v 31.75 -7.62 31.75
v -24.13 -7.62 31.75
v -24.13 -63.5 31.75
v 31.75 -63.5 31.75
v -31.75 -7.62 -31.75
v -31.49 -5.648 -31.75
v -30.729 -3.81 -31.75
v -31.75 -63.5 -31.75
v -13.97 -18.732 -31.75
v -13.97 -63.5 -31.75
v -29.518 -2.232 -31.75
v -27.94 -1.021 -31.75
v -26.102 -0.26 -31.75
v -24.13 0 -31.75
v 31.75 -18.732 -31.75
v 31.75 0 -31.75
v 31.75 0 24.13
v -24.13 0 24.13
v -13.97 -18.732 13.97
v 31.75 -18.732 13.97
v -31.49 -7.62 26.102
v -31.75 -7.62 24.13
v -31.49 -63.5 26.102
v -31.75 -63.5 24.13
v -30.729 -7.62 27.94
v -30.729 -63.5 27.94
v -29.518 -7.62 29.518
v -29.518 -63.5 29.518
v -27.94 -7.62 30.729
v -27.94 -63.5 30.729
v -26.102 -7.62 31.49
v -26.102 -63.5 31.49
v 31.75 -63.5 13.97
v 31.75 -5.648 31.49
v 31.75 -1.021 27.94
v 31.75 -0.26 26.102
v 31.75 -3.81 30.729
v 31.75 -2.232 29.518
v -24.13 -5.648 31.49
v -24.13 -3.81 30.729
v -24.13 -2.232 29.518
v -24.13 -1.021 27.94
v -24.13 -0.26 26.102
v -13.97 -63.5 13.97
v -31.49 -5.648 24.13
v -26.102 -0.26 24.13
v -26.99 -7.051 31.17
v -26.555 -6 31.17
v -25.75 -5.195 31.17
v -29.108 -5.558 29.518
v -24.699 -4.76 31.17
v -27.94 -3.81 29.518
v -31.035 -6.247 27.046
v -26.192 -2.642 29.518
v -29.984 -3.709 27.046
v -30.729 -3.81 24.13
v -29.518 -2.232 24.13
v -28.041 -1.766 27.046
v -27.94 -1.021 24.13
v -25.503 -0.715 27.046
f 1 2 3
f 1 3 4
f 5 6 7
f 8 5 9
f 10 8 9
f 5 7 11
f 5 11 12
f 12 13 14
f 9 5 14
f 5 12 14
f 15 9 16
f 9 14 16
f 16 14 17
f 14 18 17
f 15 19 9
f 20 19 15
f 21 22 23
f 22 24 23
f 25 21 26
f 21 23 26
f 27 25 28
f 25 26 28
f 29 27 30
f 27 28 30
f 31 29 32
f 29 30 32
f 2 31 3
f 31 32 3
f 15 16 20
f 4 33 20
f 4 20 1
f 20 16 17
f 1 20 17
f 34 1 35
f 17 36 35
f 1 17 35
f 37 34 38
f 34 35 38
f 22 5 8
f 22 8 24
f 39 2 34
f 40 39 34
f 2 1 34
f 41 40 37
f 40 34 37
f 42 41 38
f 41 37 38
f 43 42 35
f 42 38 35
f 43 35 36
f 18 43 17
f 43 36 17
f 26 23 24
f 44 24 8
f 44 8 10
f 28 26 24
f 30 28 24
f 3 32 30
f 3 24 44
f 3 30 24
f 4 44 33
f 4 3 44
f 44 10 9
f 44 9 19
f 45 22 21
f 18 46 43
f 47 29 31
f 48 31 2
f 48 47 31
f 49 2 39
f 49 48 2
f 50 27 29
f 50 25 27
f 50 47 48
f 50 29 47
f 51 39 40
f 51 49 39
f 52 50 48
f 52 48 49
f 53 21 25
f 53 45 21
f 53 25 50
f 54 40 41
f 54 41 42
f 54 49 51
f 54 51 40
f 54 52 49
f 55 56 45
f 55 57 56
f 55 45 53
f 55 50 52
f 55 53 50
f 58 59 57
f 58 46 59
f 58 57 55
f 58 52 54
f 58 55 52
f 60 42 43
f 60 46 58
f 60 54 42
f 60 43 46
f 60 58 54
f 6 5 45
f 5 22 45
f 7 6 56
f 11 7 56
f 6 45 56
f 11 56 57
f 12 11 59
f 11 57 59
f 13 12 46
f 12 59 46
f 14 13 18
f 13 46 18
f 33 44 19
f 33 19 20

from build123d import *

# Parameters (mm, degrees)
F0_W     = 63.5
F0_H     = 63.5
F1_DEPTH = 63.5
F2_W     = 45.72
F2_H     = 45.72
F3_DEPTH = 44.76763
F4_R     = 7.62


with BuildPart() as f1:
    # F0 (on Front) → F1 (new body)
    with BuildSketch(Plane.XZ):
        Rectangle(F0_W, F0_H)
    extrude(amount=F1_DEPTH)

    # F2 (on face) → F3 (cut)
    with BuildSketch(Plane.XZ.offset(63.5)):
        with Locations((8.89, -8.89)):
            Rectangle(F2_W, F2_H)
    extrude(amount=-F3_DEPTH, mode=Mode.SUBTRACT)

    # F4
    f4_edges = [f1.edges().sort_by_distance(p)[0] for p in [
        (-31.75, 0, 0),
        (-31.75, -31.75, 31.75),
        (0, 0, 31.75),
    ]]
    fillet(f4_edges, radius=F4_R)


solid = f1.part
